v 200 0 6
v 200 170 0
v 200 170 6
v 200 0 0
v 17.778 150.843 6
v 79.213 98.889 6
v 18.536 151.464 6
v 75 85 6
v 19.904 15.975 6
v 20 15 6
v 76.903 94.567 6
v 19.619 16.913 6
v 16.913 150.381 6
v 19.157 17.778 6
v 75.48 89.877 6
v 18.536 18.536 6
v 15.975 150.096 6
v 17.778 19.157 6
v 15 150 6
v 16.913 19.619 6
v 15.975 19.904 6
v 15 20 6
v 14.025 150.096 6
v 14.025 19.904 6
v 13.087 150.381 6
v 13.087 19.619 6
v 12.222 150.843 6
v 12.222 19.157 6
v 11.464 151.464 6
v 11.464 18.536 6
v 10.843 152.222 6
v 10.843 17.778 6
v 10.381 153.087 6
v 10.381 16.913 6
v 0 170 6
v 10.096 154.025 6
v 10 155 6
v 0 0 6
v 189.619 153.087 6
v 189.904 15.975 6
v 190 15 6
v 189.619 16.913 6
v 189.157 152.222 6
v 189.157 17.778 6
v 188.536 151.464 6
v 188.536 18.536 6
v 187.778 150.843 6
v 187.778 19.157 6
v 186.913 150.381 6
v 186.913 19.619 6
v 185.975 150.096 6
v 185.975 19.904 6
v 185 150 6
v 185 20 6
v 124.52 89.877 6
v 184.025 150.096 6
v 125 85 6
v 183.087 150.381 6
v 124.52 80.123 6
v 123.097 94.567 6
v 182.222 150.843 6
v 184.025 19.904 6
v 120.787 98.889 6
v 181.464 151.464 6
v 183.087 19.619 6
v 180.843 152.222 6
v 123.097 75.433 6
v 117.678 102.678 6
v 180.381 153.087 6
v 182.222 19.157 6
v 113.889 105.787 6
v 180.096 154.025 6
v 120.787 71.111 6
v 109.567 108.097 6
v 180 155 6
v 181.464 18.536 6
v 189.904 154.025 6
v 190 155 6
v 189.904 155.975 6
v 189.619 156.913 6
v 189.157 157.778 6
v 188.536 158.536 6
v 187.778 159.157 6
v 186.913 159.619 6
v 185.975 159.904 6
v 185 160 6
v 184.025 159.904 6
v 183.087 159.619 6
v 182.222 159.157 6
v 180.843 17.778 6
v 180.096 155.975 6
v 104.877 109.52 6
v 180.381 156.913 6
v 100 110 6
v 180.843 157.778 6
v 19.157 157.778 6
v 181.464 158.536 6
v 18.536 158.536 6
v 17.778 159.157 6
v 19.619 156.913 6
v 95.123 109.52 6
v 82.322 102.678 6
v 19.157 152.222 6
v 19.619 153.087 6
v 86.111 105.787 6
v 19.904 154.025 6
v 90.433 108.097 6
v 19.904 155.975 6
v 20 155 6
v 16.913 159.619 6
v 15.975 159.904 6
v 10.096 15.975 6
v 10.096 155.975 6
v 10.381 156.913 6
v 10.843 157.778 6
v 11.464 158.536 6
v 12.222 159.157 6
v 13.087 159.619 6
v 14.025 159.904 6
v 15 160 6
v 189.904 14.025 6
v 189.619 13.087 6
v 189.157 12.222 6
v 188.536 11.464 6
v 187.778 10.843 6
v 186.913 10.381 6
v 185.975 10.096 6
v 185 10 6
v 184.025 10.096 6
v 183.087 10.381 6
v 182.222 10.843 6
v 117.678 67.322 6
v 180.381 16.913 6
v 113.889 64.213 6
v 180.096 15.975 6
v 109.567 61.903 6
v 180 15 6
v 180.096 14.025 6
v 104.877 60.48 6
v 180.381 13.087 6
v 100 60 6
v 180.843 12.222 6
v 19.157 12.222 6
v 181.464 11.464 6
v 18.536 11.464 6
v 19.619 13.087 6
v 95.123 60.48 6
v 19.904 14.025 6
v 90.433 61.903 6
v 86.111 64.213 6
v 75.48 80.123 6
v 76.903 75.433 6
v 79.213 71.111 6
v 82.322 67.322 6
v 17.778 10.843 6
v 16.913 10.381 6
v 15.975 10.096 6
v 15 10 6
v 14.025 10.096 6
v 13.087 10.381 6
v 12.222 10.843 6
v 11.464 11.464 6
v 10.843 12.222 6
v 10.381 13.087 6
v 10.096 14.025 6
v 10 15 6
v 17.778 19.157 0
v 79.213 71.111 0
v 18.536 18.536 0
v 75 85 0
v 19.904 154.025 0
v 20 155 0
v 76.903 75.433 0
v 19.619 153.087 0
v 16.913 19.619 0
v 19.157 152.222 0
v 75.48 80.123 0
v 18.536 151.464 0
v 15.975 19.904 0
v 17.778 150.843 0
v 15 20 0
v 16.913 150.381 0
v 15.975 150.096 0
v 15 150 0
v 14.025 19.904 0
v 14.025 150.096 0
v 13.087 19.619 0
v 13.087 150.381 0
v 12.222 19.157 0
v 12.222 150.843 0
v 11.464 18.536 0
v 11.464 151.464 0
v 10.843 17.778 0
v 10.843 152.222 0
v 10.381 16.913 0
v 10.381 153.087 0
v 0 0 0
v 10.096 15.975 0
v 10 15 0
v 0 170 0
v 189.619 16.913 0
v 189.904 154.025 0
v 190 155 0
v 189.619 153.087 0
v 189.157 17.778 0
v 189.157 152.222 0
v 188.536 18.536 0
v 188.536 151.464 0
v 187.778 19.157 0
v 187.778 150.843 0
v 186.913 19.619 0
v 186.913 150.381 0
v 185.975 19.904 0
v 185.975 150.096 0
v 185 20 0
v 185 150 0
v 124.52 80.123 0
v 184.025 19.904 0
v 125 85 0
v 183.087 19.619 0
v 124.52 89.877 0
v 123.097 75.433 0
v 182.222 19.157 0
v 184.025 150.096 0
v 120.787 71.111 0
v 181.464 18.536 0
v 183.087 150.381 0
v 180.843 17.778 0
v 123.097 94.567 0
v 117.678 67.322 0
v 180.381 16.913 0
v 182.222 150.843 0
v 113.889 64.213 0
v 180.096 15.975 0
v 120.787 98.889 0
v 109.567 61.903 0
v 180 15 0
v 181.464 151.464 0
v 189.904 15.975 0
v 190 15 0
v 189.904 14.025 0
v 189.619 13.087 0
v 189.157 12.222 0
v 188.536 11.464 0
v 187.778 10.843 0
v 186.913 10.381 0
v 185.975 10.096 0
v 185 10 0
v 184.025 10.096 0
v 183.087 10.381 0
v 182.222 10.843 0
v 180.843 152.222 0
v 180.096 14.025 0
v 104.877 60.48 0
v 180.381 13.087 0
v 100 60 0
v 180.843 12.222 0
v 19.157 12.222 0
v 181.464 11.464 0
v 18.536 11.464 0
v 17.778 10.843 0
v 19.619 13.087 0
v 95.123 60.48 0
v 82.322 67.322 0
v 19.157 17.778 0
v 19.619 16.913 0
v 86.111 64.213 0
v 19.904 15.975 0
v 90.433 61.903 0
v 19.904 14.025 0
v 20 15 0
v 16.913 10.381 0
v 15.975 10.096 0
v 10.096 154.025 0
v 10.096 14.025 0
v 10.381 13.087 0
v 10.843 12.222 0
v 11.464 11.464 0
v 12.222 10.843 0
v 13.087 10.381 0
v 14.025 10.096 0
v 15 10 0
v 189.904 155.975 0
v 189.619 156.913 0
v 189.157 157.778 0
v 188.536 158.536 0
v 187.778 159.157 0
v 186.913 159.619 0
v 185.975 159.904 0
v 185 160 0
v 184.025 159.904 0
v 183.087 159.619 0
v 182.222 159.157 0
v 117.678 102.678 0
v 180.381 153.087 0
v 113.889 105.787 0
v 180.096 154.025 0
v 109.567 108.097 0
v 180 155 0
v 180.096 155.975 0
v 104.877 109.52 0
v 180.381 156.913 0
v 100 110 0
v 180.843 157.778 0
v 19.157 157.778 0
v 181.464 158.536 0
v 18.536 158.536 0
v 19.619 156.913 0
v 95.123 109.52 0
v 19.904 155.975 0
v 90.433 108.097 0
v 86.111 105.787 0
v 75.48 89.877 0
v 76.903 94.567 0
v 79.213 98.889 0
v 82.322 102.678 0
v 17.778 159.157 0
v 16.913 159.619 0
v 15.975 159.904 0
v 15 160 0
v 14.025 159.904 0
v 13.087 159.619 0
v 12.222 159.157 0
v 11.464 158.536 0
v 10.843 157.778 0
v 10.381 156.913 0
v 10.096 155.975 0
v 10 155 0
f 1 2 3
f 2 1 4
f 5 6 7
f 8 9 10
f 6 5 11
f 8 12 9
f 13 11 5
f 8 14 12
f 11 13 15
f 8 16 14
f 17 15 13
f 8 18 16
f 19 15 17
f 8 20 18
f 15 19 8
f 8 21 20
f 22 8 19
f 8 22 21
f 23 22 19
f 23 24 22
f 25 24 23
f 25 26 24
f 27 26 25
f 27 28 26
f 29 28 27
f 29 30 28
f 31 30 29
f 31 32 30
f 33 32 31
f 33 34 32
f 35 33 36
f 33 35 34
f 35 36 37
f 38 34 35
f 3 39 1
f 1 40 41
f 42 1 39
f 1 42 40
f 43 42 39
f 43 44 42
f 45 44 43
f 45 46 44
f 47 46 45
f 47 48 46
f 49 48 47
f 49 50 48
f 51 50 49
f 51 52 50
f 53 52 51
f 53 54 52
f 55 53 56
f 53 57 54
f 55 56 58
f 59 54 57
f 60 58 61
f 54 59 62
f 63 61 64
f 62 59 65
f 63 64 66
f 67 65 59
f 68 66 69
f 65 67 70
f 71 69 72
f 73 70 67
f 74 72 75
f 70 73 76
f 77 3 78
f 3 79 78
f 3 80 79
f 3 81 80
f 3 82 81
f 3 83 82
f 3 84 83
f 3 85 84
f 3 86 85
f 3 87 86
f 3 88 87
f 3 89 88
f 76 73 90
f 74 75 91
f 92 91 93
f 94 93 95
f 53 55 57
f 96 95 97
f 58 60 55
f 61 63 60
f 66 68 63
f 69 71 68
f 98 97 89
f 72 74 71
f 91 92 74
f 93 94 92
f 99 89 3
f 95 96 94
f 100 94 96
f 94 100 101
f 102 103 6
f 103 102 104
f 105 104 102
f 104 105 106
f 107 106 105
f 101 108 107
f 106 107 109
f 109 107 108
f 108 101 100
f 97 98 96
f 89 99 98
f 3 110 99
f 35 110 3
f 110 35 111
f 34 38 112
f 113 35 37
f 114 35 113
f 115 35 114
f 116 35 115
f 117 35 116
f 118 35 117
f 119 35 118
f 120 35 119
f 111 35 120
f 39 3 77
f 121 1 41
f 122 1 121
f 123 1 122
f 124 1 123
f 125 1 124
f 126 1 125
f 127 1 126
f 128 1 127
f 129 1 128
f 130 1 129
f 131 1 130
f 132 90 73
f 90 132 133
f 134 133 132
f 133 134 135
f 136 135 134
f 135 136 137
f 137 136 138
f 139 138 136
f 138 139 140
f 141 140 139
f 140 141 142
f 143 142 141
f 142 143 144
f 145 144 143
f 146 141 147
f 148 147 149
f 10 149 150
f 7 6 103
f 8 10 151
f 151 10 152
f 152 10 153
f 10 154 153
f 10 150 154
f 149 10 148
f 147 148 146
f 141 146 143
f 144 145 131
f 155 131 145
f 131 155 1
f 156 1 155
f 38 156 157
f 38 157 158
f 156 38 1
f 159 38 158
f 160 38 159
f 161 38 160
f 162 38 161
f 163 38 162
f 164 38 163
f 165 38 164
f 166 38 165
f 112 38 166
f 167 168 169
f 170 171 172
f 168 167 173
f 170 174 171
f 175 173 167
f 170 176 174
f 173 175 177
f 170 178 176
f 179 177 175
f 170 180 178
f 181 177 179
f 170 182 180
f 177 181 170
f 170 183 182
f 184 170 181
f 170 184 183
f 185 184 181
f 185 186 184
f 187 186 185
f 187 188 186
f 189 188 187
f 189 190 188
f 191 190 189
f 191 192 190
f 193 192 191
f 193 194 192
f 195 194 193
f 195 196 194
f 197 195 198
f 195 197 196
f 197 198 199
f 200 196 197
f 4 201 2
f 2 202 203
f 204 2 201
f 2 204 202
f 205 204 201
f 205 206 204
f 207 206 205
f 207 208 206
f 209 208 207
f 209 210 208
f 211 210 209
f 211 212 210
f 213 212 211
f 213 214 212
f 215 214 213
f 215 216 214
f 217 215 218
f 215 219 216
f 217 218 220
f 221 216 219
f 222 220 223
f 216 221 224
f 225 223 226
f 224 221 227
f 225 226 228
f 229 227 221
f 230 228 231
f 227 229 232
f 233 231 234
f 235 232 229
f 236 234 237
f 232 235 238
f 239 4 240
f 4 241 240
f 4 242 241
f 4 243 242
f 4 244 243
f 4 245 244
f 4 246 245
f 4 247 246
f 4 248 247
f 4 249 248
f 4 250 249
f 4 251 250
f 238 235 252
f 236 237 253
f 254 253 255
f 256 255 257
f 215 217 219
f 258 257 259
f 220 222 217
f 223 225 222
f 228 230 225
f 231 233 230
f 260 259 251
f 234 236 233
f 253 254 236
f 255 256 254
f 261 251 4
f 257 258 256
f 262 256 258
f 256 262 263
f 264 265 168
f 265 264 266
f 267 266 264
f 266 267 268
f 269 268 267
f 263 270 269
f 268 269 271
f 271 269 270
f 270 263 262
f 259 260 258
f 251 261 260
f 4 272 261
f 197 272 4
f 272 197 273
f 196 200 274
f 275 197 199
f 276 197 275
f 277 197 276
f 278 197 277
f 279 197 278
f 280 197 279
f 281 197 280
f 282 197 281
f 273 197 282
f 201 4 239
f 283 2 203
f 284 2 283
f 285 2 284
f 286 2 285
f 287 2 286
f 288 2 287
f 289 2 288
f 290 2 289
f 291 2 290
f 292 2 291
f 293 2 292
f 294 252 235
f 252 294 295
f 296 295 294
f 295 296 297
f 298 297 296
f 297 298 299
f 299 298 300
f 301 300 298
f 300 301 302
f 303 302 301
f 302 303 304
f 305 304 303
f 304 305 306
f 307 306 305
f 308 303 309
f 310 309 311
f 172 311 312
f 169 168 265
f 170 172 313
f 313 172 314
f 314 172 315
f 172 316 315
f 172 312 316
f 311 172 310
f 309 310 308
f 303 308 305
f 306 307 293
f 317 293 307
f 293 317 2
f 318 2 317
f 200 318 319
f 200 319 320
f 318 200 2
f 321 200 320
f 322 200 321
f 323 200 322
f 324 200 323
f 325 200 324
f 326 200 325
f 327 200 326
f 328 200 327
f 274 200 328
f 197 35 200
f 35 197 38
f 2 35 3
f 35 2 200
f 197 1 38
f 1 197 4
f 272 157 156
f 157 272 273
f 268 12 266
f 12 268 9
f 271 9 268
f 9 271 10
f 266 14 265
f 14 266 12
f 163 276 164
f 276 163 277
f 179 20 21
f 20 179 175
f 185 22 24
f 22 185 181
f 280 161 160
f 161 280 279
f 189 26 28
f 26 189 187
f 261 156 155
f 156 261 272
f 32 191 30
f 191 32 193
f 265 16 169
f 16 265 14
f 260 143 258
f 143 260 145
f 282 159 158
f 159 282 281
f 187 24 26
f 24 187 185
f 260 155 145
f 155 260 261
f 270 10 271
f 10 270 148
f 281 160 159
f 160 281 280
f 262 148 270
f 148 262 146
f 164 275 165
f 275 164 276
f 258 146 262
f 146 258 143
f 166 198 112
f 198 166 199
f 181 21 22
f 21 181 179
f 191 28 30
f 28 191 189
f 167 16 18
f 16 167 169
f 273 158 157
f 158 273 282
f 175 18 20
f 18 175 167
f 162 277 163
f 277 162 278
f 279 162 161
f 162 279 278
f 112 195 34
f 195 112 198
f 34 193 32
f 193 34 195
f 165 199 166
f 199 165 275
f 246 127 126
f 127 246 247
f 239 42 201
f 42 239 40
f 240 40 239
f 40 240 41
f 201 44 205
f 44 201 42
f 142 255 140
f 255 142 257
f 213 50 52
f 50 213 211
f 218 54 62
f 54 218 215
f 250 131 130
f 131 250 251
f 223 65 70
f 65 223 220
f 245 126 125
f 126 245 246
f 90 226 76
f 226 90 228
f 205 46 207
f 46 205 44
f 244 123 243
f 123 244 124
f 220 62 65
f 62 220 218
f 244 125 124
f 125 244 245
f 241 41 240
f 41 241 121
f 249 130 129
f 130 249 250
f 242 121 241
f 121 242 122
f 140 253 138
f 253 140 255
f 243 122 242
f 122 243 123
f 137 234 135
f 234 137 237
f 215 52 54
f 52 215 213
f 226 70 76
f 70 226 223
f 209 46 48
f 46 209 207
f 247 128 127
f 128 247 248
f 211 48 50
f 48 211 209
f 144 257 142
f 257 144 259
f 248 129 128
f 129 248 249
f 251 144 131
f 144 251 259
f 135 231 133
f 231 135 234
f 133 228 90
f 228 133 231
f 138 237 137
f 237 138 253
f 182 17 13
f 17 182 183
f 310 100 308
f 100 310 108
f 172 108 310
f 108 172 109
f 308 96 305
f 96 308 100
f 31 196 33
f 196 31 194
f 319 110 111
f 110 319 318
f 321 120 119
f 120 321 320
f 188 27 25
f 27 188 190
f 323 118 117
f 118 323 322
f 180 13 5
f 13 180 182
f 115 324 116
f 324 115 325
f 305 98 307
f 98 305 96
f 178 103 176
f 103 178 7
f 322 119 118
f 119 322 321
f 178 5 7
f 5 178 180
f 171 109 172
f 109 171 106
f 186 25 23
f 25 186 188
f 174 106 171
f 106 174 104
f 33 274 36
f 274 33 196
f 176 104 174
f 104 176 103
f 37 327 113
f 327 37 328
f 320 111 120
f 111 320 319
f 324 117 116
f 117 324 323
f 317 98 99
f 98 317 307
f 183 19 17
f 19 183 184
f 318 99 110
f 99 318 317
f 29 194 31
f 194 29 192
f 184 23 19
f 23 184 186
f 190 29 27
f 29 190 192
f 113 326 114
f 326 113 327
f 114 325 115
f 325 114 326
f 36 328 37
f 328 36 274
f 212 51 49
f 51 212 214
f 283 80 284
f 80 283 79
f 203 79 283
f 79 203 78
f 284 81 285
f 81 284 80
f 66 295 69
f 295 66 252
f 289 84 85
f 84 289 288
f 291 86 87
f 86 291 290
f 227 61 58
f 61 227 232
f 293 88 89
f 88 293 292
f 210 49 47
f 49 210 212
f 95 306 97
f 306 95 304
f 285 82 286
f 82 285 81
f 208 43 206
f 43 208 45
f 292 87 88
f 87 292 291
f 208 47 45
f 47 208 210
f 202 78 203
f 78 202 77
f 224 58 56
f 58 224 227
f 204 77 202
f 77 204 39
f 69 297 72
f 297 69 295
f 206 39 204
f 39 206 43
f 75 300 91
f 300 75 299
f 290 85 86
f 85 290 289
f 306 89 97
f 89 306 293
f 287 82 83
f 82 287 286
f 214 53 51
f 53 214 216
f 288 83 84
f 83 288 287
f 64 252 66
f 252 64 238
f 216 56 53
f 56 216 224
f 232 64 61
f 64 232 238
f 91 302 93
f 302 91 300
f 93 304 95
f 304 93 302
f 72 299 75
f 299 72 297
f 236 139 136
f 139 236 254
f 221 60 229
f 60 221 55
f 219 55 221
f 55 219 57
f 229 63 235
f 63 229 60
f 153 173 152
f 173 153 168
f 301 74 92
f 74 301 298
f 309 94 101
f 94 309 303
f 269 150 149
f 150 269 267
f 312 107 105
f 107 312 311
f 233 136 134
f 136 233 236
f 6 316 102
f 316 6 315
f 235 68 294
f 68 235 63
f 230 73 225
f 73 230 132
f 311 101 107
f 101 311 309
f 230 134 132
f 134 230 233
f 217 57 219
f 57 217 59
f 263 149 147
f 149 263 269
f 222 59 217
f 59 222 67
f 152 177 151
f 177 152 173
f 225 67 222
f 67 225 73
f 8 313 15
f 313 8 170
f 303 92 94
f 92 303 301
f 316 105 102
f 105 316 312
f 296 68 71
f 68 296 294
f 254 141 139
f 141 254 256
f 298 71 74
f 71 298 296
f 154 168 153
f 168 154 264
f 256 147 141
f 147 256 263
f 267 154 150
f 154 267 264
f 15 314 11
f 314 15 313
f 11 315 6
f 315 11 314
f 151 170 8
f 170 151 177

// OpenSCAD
$fn = 32;

// ----------------------------------------------------------------------
// Big plate: 200-250 mm adapter plate
// ----------------------------------------------------------------------

// --- parameters (mm) ---
plate_l = 200;            // plate length, X
plate_w = 170;            // plate width, Y
plate_t = 6;              // plate thickness, Z
corner_d = 10;            // corner hole diameter
corner_in = 15;           // corner hole inset from the edges
bore_d = 50;              // central bore
fit_tol = 0.1;            // tolerance for press fits, mm
free_tol = 0.5;           // tolerance for clearance fits, mm

difference() {
  cube([plate_l, plate_w, plate_t]);
  translate([corner_in, corner_in, -1]) cylinder(h = plate_t + 2, d = corner_d);
  translate([plate_l - corner_in, corner_in, -1]) cylinder(h = plate_t + 2, d = corner_d);
  translate([corner_in, plate_w - corner_in, -1]) cylinder(h = plate_t + 2, d = corner_d);
  translate([plate_l - corner_in, plate_w - corner_in, -1]) cylinder(h = plate_t + 2, d = corner_d);
  translate([plate_l / 2, plate_w / 2, -1]) cylinder(h = plate_t + 2, d = bore_d);
}
